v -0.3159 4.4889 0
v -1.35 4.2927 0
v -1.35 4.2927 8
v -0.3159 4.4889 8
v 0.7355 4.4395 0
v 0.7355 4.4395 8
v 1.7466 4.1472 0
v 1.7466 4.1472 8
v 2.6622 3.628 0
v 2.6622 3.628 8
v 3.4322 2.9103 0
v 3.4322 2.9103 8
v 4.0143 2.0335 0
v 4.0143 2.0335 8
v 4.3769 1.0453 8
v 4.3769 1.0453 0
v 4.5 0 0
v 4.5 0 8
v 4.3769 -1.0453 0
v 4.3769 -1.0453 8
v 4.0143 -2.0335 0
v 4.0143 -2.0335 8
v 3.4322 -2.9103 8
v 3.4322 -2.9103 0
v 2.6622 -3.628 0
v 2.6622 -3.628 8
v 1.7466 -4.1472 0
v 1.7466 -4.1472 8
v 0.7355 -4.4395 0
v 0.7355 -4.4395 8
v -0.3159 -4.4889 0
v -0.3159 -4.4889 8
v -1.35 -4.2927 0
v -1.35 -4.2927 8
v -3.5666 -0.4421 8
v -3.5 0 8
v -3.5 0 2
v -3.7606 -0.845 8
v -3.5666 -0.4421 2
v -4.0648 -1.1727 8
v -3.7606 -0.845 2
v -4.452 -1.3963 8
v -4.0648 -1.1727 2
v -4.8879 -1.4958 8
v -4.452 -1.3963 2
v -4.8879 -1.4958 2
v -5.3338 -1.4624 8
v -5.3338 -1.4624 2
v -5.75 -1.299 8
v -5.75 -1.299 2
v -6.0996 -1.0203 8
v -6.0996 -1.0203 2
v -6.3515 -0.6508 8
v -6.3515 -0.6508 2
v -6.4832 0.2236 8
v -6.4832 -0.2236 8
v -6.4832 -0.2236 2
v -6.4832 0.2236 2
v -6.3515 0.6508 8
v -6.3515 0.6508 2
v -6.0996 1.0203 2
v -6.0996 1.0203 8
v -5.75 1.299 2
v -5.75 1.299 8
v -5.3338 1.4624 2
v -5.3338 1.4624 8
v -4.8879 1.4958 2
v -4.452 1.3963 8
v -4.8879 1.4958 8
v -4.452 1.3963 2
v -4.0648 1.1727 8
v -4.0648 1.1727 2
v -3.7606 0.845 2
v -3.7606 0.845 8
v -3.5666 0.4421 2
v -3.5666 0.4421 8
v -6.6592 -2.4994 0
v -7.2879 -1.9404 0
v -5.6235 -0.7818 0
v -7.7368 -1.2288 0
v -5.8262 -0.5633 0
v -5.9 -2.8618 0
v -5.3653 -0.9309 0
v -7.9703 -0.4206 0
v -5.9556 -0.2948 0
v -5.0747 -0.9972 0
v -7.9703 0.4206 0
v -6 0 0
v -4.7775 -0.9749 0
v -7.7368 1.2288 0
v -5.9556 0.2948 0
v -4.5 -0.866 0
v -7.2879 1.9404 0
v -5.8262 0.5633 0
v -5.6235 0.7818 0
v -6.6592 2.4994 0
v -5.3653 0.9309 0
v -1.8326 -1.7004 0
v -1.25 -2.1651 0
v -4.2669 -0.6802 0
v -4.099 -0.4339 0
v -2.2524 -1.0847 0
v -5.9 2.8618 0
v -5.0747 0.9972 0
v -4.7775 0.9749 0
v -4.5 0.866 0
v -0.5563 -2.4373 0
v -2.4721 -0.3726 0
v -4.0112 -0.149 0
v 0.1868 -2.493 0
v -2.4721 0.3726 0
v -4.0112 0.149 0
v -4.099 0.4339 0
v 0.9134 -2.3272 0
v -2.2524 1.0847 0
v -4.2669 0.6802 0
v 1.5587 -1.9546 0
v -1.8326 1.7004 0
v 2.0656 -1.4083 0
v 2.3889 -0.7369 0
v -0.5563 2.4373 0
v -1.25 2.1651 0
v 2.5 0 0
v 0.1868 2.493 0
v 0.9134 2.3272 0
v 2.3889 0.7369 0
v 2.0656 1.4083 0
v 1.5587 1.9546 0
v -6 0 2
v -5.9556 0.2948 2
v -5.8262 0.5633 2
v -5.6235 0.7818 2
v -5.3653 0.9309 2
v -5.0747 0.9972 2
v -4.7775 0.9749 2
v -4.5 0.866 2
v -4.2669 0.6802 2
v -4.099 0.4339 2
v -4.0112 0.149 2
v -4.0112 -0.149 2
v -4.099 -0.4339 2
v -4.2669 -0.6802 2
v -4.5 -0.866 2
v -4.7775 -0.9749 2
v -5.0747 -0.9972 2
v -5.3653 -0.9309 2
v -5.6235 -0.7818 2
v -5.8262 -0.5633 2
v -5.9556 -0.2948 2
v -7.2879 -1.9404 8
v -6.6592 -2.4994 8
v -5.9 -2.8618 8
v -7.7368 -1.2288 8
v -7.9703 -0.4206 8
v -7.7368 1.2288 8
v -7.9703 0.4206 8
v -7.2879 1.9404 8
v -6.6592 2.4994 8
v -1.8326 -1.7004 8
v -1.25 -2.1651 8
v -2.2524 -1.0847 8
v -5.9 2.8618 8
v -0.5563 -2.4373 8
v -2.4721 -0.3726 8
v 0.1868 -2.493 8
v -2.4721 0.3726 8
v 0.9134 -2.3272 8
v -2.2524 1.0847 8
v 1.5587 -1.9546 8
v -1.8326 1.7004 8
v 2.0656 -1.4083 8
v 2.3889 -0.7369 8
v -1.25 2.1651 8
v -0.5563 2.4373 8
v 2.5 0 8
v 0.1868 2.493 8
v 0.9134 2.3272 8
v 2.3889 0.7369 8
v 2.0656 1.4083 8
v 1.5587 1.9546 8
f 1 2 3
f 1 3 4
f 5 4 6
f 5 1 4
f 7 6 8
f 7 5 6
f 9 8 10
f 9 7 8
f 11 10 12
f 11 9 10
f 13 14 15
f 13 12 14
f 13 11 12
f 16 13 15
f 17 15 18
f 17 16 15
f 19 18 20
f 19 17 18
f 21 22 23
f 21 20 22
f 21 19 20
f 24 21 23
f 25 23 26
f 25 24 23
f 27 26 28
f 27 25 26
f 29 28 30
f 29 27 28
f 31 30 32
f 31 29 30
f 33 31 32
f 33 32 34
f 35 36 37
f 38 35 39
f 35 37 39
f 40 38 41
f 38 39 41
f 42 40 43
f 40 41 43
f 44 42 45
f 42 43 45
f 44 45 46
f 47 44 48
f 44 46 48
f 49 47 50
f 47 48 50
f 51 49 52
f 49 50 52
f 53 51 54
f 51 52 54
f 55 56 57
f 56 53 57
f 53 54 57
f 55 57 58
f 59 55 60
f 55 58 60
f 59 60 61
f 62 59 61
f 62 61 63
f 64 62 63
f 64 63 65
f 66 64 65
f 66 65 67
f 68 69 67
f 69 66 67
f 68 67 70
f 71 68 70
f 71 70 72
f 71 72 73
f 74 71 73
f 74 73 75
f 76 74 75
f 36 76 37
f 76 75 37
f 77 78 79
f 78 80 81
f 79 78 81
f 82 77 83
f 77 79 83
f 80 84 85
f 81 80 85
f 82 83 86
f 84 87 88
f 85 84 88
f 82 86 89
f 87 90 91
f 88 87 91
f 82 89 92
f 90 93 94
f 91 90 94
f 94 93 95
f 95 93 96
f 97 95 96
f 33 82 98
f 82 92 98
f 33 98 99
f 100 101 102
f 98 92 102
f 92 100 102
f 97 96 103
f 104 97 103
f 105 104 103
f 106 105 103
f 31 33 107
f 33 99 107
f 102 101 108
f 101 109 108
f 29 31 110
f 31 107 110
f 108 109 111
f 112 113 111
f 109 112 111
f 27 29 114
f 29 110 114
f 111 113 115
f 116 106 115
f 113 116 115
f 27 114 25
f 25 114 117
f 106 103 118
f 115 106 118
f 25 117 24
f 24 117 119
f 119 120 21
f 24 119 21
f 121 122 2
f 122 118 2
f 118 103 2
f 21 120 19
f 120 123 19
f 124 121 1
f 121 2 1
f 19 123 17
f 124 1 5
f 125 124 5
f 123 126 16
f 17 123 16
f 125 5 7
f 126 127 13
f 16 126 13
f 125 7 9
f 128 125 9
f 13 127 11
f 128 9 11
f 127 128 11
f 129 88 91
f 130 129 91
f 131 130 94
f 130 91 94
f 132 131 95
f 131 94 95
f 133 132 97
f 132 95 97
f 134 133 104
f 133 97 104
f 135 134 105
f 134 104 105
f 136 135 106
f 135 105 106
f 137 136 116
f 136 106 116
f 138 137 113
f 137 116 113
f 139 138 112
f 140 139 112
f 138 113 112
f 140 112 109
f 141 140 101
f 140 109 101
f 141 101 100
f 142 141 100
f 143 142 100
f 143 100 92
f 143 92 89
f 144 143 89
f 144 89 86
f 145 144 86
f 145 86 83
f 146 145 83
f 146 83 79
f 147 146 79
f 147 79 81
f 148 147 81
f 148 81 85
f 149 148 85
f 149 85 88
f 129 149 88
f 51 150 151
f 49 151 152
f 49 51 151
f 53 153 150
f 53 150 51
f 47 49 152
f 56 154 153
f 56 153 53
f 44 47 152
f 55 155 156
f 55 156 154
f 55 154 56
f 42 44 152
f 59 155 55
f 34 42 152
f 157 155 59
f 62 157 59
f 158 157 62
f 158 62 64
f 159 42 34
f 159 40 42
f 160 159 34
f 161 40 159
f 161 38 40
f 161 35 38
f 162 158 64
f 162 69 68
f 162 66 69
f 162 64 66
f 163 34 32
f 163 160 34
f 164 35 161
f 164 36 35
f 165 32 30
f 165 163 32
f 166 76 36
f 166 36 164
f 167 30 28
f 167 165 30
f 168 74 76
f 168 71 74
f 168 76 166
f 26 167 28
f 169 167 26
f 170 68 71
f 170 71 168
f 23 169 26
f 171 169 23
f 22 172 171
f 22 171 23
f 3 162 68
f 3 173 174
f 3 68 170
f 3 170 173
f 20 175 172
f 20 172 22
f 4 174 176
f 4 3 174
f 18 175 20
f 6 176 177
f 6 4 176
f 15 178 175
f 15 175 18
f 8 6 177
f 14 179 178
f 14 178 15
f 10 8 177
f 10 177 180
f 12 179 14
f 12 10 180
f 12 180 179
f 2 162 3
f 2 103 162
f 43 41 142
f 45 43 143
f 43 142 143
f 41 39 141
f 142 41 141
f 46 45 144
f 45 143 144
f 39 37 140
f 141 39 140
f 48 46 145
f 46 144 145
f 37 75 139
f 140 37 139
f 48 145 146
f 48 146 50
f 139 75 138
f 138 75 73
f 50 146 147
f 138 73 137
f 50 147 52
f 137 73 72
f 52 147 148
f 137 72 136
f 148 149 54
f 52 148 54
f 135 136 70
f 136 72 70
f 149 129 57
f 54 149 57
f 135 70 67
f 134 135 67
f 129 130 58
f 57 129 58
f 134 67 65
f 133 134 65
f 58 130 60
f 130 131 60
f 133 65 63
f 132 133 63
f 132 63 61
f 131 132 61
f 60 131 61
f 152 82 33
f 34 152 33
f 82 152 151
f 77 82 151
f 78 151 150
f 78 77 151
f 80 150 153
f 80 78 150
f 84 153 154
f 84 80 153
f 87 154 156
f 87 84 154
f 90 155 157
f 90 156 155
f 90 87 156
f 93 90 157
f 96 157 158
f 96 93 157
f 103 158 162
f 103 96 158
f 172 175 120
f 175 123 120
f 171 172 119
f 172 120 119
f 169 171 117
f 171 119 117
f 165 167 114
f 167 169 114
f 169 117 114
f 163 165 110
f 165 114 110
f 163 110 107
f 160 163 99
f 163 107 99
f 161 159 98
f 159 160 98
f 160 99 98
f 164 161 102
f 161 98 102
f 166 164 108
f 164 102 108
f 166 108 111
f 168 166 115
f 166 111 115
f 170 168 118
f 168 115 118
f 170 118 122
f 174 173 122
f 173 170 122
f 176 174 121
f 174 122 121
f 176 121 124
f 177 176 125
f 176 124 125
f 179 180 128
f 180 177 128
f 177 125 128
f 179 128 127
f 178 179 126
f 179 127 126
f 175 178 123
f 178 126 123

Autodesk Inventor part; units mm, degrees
ref_plane "YZ Plane" through (0, 0, 0) normal (1, 0, 0) x (0, 1, 0)
ref_plane "XZ Plane" through (0, 0, 0) normal (0, 1, 0) x (-1, 0, 0)
ref_plane "XY Plane" through (0, 0, 0) normal (0, 0, 1) x (1, 0, 0)
sketch "Sketch1" plane through (0, 0, 0) normal (0, 0, 1) x (1, 0, 0)
  circle A0 centre (0, 0) radius 2.5
  circle A1 centre (-5, 0) radius 1.5
  arc A2 (-5.9, 2.8618) -> (-5.9, -2.8618) centre (-5, 0) ccw
  arc A3 (-1.35, -4.2927) -> (-1.35, 4.2927) centre (0, 0) ccw
  line L0 (-5.9, 2.8618) -> (-1.35, 4.2927)
  line L1 (-5.9, -2.8618) -> (-1.35, -4.2927)
  dimension "d0" = 5
  dimension "d1" = 3
  dimension "d2" = 9
  dimension "d3" = 5
  dimension "d4" = 1.5
extrude "Extrusion1" add sketch "Sketch1" along normal blind 8
sketch "Sketch2" plane through (0, 0, 0) normal (0, 0, -1) x (-1, 0, 0)
  circle A0 centre (5, 0) radius 1.5 projected
  circle A1 centre (5, 0) radius 1
  point P0 (0, 0)
  dimension "d21" = 2
extrude "Extrusion2" add sketch "Sketch2" against normal blind 2
sketch "Sketch3" plane through (0, 0, 0) normal (1, 0, 0) x (0, 1, 0)
  circle A0 centre (0, 4) radius 1.5
  line L0 (2.5, 8) -> (2.5, 0) projected
  point P0 (0, 0)
  point P1 (2.5, 4)
  dimension "d13" = 3
properties part number "Anode Holding Nut" material "Stainless Steel"
